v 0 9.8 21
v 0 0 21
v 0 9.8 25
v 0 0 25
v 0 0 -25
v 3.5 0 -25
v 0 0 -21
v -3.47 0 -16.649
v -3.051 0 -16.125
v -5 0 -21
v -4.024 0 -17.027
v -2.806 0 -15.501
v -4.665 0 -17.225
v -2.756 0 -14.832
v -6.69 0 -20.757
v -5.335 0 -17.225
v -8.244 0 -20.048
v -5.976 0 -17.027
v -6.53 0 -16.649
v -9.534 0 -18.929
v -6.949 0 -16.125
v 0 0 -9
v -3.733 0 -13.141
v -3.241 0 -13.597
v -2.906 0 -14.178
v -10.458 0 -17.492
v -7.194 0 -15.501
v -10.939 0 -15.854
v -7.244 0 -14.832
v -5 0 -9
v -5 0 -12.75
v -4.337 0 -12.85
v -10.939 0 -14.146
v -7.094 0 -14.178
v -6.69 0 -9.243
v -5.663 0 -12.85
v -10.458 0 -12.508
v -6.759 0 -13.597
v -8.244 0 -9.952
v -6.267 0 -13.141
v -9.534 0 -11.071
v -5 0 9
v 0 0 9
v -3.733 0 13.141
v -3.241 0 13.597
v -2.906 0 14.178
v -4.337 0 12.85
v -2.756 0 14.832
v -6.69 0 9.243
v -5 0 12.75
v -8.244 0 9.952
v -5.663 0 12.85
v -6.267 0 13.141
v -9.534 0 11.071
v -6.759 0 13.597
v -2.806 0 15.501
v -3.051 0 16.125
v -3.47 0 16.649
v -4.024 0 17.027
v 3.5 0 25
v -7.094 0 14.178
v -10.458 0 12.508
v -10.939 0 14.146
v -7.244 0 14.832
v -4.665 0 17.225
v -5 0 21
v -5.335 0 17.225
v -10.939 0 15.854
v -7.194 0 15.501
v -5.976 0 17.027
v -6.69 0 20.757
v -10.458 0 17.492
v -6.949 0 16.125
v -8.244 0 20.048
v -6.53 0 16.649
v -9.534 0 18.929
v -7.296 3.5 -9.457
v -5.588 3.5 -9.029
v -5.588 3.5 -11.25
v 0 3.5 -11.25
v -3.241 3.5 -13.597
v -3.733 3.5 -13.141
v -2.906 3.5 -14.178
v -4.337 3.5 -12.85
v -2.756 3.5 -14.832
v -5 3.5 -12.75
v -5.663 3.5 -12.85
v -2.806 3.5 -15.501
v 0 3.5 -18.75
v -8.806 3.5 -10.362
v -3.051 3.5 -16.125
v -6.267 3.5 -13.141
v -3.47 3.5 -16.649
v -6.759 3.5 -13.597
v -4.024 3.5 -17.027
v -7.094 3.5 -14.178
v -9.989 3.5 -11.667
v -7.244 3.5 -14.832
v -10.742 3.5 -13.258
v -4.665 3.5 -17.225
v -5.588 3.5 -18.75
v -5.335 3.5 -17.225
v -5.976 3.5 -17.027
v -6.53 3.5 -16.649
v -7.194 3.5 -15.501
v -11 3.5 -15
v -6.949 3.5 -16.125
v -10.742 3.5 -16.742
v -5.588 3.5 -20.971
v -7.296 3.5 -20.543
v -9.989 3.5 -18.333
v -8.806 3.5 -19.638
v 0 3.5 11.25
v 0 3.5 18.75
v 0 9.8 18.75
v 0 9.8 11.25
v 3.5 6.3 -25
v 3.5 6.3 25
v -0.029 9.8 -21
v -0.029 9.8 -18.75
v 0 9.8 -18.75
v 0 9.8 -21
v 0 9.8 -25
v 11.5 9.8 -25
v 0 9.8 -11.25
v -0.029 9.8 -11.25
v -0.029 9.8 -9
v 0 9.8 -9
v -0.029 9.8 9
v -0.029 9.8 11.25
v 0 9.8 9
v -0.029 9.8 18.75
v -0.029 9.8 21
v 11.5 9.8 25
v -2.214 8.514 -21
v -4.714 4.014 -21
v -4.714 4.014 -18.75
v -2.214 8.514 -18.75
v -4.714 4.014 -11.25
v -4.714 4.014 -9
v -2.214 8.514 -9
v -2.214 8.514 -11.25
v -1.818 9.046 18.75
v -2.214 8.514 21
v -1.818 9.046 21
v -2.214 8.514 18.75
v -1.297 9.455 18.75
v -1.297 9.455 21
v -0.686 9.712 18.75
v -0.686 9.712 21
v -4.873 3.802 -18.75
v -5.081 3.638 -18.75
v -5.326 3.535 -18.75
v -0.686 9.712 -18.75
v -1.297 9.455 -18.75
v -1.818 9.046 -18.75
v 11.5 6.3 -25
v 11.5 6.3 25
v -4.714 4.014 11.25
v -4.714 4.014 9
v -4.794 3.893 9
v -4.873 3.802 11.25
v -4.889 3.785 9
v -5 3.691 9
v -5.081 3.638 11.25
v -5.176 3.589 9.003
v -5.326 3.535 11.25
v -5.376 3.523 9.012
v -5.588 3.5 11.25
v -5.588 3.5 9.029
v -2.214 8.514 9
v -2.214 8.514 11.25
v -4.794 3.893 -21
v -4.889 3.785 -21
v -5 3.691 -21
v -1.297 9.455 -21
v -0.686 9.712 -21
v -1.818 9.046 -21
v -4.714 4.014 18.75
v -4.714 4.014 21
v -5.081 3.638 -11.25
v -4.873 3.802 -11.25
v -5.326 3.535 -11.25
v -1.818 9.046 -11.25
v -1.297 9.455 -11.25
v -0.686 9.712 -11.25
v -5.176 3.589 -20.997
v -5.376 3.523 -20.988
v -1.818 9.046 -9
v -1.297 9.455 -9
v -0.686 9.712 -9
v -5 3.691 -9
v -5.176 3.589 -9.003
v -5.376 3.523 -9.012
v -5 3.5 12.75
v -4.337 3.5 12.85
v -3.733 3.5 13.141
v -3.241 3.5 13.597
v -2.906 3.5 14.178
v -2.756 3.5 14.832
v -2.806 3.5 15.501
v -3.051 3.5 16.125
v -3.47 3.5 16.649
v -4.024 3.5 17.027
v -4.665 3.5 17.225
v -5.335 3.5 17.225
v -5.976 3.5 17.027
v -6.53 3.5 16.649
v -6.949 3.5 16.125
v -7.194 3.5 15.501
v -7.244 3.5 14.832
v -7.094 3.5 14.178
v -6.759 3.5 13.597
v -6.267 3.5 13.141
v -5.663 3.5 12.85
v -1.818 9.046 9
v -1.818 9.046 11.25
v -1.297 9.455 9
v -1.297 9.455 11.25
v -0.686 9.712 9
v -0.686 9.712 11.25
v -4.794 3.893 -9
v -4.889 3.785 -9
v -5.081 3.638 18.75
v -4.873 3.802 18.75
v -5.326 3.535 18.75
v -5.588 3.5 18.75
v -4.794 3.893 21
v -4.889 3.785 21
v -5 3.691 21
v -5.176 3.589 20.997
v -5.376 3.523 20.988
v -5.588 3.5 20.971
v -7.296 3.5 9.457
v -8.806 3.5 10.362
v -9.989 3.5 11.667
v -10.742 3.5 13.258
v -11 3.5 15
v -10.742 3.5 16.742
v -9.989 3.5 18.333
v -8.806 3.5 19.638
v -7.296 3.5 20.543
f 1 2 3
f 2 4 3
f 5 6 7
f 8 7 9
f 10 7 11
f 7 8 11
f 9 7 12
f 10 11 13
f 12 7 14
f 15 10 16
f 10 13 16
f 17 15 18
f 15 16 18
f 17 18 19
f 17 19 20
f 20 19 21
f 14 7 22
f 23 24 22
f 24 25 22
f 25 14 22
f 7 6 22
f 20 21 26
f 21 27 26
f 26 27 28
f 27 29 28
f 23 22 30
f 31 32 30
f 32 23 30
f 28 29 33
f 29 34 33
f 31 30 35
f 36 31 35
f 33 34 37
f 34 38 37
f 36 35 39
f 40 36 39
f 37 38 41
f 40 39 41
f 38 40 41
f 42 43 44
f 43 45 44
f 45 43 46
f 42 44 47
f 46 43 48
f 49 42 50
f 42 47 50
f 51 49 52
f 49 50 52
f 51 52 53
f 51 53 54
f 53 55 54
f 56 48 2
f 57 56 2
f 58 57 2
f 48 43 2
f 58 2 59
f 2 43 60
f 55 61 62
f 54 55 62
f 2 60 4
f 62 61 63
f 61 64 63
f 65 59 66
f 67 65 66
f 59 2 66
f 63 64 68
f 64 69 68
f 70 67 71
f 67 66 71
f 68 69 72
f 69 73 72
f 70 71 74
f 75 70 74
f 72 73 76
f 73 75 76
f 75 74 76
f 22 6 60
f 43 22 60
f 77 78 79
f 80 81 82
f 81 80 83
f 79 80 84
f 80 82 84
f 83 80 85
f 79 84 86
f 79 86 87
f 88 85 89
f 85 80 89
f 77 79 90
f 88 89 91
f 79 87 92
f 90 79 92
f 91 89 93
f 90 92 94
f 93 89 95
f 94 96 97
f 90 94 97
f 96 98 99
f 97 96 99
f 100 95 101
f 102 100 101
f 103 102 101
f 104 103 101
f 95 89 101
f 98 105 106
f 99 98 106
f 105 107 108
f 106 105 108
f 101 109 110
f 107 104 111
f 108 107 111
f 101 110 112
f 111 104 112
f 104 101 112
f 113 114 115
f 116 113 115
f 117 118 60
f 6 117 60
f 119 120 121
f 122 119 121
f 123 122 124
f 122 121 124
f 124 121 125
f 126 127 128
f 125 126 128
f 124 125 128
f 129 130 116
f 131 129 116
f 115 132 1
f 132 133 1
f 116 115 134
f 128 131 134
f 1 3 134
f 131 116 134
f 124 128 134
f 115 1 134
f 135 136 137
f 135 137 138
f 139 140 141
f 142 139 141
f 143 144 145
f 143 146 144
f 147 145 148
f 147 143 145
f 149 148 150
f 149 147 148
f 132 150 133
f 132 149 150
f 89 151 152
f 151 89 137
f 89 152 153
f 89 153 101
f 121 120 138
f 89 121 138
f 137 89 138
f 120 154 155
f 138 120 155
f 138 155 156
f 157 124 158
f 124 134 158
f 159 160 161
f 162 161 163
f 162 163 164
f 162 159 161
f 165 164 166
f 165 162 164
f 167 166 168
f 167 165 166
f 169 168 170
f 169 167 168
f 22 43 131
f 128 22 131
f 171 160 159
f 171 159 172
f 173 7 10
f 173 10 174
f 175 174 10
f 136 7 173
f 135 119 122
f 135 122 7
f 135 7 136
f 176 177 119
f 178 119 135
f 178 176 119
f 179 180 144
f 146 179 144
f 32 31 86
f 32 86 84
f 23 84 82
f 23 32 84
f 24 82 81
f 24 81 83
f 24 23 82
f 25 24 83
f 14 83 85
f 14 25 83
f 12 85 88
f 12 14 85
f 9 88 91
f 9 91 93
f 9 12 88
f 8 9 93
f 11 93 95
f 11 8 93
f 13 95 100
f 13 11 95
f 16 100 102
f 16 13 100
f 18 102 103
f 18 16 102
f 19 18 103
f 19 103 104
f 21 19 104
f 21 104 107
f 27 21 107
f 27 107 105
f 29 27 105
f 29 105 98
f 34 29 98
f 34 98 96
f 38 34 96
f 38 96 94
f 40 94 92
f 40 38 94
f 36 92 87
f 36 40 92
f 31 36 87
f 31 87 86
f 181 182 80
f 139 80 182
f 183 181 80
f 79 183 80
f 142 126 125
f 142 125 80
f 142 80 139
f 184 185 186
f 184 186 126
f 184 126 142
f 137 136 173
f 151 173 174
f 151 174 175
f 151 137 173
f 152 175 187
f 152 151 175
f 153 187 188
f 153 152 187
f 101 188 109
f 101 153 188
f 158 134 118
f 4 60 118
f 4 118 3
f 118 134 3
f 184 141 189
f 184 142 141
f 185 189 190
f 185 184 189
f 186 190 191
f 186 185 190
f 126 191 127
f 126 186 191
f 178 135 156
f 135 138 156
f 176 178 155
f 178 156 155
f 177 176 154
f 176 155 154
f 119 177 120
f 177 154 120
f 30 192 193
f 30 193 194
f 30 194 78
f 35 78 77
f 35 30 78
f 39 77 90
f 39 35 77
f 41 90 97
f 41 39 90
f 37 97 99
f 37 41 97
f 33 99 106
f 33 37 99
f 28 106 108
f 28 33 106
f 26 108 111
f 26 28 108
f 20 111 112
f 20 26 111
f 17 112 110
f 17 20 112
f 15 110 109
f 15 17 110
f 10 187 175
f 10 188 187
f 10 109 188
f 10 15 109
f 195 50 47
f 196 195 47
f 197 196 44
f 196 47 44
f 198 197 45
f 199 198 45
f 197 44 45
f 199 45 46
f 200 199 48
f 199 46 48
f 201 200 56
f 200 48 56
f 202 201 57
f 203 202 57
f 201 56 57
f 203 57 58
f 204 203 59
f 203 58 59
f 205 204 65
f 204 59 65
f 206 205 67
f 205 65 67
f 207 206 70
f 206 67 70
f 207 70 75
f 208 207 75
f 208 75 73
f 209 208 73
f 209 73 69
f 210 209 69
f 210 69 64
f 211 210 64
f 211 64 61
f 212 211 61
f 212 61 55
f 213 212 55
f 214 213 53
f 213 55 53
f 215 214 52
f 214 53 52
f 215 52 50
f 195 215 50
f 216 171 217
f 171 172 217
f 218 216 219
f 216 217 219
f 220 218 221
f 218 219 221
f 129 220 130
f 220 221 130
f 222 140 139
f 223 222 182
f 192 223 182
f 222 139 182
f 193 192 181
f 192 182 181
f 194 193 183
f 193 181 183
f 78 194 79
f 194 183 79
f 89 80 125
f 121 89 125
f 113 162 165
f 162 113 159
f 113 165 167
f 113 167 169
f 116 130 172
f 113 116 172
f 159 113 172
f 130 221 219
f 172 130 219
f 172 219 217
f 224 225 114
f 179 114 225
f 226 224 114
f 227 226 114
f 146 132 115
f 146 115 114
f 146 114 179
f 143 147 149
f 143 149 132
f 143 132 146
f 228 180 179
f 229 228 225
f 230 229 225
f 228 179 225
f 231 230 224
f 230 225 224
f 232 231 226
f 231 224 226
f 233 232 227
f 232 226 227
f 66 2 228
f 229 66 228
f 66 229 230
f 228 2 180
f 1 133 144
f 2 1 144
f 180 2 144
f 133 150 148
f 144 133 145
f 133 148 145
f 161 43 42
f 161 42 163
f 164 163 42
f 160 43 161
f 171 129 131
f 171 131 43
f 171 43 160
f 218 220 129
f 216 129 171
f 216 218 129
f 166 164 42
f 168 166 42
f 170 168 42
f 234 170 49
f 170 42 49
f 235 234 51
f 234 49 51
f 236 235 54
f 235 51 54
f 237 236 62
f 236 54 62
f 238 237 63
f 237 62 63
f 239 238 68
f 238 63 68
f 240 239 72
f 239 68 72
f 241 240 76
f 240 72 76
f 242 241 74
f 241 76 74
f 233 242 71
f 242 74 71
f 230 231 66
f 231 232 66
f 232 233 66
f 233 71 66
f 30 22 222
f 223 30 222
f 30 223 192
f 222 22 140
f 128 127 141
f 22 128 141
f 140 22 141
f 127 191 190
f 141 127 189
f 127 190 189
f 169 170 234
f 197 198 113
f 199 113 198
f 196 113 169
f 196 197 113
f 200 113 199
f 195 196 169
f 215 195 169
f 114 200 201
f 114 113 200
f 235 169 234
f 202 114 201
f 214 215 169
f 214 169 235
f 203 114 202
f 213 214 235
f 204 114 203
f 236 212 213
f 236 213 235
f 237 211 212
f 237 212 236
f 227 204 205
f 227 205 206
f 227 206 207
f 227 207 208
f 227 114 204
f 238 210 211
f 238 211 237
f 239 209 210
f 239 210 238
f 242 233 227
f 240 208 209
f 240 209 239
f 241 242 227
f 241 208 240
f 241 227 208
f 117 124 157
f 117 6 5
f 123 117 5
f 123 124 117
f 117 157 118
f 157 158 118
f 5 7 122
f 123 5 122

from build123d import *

# Parameters (mm, degrees)
SALIENTE_EXTRUIR1_DEPTH  = 25
CROQUIS2_R               = 2.25
SALIENTE_EXTRUIR2_DEPTH  = 3.5
SALIENTE_EXTRUIR3_DEPTH  = 2.25
REDONDEO3_R              = 1
REDONDEO5_R              = 2.5
REDONDEO3_OF_SIMETR_A1_R = 1
REDONDEO5_OF_SIMETR_A1_R = 2.5
REDONDEO3_OF_SIMETR_A4_R = 1
REDONDEO5_OF_SIMETR_A4_R = 2.5
SALIENTE_EXTRUIR4_DEPTH  = 2.25
REDONDEO6_R              = 2.5
REDONDEO7_R              = 1


with BuildPart() as part:
    # Croquis1 → Saliente-Extruir1 (new, symmetric)
    with BuildSketch(Plane.XY):
        Polygon((0, 0), (0, 9.8), (11.5, 9.8), (11.5, 6.3), (3.5, 6.3), (3.5, 0), align=None)
    extrude(amount=SALIENTE_EXTRUIR1_DEPTH, both=True)

    # Croquis2 → Saliente-Extruir2 (add)
    with BuildSketch(Plane(origin=(0, 0, 0), x_dir=(1, 0, 0), z_dir=(0, 1, 0))):
        with BuildLine():
            Line((0, 9), (-5, 9))
            ThreePointArc((-5, 9), (-11, 15), (-5, 21))
            Line((-5, 21), (0, 21))
            Line((0, 21), (0, 9))
        make_face()
        with Locations(Location((-5, 15, 0), (0, 0, 270))):
            Circle(CROQUIS2_R, mode=Mode.SUBTRACT)
    saliente_extruir2 = extrude(amount=SALIENTE_EXTRUIR2_DEPTH)

    # Croquis3 → Saliente-Extruir3 (add)
    with BuildSketch(Plane.XY.offset(-9)):
        Polygon((0, 9.8), (0, 3.5), (-5, 3.5), (-1.5, 9.8), align=None)
    saliente_extruir3 = extrude(amount=-SALIENTE_EXTRUIR3_DEPTH)

    # Redondeo3
    redondeo3_edges = [part.edges().sort_by_distance(p)[0] for p in [
        (-5, 3.5, -10.125),
    ]]
    fillet(redondeo3_edges, radius=REDONDEO3_R)

    # Redondeo5
    redondeo5_edges = [part.edges().sort_by_distance(p)[0] for p in [
        (-1.5, 9.8, -10.125),
    ]]
    fillet(redondeo5_edges, radius=REDONDEO5_R)

    # Simetría1: Saliente-Extruir3 across plane
    add(saliente_extruir3.mirror(Plane(origin=(0, 0, -15), x_dir=(1, 0, 0), z_dir=(0, 0, -1))))

    # Redondeo3 of Simetría1
    redondeo3_of_simetr_a1_edges = [part.edges().sort_by_distance(p)[0] for p in [
        (-5, 3.5, -19.875),
    ]]
    fillet(redondeo3_of_simetr_a1_edges, radius=REDONDEO3_OF_SIMETR_A1_R)

    # Redondeo5 of Simetría1
    redondeo5_of_simetr_a1_edges = [part.edges().sort_by_distance(p)[0] for p in [
        (-1.5, 9.8, -19.875),
    ]]
    fillet(redondeo5_of_simetr_a1_edges, radius=REDONDEO5_OF_SIMETR_A1_R)

    # Simetría4: Saliente-Extruir2, Saliente-Extruir3 across plane
    add(saliente_extruir2.mirror(Plane.XY))
    add(saliente_extruir3.mirror(Plane.XY))

    # Redondeo3 of Simetría4
    redondeo3_of_simetr_a4_edges = [part.edges().sort_by_distance(p)[0] for p in [
        (-5, 3.5, 10.125),
    ]]
    fillet(redondeo3_of_simetr_a4_edges, radius=REDONDEO3_OF_SIMETR_A4_R)

    # Redondeo5 of Simetría4
    redondeo5_of_simetr_a4_edges = [part.edges().sort_by_distance(p)[0] for p in [
        (-1.5, 9.8, 10.125),
    ]]
    fillet(redondeo5_of_simetr_a4_edges, radius=REDONDEO5_OF_SIMETR_A4_R)

    # Croquis4 → Saliente-Extruir4 (add)
    with BuildSketch(Plane.XY.offset(21)):
        Polygon((0, 3.5), (-5, 3.5), (-1.5, 9.8), (0, 9.8), align=None)
    extrude(amount=-SALIENTE_EXTRUIR4_DEPTH)

    # Redondeo6
    redondeo6_edges = [part.edges().sort_by_distance(p)[0] for p in [
        (-1.5, 9.8, 19.875),
    ]]
    fillet(redondeo6_edges, radius=REDONDEO6_R)

    # Redondeo7
    redondeo7_edges = [part.edges().sort_by_distance(p)[0] for p in [
        (-5, 3.5, 19.875),
    ]]
    fillet(redondeo7_edges, radius=REDONDEO7_R)


solid = part.part
